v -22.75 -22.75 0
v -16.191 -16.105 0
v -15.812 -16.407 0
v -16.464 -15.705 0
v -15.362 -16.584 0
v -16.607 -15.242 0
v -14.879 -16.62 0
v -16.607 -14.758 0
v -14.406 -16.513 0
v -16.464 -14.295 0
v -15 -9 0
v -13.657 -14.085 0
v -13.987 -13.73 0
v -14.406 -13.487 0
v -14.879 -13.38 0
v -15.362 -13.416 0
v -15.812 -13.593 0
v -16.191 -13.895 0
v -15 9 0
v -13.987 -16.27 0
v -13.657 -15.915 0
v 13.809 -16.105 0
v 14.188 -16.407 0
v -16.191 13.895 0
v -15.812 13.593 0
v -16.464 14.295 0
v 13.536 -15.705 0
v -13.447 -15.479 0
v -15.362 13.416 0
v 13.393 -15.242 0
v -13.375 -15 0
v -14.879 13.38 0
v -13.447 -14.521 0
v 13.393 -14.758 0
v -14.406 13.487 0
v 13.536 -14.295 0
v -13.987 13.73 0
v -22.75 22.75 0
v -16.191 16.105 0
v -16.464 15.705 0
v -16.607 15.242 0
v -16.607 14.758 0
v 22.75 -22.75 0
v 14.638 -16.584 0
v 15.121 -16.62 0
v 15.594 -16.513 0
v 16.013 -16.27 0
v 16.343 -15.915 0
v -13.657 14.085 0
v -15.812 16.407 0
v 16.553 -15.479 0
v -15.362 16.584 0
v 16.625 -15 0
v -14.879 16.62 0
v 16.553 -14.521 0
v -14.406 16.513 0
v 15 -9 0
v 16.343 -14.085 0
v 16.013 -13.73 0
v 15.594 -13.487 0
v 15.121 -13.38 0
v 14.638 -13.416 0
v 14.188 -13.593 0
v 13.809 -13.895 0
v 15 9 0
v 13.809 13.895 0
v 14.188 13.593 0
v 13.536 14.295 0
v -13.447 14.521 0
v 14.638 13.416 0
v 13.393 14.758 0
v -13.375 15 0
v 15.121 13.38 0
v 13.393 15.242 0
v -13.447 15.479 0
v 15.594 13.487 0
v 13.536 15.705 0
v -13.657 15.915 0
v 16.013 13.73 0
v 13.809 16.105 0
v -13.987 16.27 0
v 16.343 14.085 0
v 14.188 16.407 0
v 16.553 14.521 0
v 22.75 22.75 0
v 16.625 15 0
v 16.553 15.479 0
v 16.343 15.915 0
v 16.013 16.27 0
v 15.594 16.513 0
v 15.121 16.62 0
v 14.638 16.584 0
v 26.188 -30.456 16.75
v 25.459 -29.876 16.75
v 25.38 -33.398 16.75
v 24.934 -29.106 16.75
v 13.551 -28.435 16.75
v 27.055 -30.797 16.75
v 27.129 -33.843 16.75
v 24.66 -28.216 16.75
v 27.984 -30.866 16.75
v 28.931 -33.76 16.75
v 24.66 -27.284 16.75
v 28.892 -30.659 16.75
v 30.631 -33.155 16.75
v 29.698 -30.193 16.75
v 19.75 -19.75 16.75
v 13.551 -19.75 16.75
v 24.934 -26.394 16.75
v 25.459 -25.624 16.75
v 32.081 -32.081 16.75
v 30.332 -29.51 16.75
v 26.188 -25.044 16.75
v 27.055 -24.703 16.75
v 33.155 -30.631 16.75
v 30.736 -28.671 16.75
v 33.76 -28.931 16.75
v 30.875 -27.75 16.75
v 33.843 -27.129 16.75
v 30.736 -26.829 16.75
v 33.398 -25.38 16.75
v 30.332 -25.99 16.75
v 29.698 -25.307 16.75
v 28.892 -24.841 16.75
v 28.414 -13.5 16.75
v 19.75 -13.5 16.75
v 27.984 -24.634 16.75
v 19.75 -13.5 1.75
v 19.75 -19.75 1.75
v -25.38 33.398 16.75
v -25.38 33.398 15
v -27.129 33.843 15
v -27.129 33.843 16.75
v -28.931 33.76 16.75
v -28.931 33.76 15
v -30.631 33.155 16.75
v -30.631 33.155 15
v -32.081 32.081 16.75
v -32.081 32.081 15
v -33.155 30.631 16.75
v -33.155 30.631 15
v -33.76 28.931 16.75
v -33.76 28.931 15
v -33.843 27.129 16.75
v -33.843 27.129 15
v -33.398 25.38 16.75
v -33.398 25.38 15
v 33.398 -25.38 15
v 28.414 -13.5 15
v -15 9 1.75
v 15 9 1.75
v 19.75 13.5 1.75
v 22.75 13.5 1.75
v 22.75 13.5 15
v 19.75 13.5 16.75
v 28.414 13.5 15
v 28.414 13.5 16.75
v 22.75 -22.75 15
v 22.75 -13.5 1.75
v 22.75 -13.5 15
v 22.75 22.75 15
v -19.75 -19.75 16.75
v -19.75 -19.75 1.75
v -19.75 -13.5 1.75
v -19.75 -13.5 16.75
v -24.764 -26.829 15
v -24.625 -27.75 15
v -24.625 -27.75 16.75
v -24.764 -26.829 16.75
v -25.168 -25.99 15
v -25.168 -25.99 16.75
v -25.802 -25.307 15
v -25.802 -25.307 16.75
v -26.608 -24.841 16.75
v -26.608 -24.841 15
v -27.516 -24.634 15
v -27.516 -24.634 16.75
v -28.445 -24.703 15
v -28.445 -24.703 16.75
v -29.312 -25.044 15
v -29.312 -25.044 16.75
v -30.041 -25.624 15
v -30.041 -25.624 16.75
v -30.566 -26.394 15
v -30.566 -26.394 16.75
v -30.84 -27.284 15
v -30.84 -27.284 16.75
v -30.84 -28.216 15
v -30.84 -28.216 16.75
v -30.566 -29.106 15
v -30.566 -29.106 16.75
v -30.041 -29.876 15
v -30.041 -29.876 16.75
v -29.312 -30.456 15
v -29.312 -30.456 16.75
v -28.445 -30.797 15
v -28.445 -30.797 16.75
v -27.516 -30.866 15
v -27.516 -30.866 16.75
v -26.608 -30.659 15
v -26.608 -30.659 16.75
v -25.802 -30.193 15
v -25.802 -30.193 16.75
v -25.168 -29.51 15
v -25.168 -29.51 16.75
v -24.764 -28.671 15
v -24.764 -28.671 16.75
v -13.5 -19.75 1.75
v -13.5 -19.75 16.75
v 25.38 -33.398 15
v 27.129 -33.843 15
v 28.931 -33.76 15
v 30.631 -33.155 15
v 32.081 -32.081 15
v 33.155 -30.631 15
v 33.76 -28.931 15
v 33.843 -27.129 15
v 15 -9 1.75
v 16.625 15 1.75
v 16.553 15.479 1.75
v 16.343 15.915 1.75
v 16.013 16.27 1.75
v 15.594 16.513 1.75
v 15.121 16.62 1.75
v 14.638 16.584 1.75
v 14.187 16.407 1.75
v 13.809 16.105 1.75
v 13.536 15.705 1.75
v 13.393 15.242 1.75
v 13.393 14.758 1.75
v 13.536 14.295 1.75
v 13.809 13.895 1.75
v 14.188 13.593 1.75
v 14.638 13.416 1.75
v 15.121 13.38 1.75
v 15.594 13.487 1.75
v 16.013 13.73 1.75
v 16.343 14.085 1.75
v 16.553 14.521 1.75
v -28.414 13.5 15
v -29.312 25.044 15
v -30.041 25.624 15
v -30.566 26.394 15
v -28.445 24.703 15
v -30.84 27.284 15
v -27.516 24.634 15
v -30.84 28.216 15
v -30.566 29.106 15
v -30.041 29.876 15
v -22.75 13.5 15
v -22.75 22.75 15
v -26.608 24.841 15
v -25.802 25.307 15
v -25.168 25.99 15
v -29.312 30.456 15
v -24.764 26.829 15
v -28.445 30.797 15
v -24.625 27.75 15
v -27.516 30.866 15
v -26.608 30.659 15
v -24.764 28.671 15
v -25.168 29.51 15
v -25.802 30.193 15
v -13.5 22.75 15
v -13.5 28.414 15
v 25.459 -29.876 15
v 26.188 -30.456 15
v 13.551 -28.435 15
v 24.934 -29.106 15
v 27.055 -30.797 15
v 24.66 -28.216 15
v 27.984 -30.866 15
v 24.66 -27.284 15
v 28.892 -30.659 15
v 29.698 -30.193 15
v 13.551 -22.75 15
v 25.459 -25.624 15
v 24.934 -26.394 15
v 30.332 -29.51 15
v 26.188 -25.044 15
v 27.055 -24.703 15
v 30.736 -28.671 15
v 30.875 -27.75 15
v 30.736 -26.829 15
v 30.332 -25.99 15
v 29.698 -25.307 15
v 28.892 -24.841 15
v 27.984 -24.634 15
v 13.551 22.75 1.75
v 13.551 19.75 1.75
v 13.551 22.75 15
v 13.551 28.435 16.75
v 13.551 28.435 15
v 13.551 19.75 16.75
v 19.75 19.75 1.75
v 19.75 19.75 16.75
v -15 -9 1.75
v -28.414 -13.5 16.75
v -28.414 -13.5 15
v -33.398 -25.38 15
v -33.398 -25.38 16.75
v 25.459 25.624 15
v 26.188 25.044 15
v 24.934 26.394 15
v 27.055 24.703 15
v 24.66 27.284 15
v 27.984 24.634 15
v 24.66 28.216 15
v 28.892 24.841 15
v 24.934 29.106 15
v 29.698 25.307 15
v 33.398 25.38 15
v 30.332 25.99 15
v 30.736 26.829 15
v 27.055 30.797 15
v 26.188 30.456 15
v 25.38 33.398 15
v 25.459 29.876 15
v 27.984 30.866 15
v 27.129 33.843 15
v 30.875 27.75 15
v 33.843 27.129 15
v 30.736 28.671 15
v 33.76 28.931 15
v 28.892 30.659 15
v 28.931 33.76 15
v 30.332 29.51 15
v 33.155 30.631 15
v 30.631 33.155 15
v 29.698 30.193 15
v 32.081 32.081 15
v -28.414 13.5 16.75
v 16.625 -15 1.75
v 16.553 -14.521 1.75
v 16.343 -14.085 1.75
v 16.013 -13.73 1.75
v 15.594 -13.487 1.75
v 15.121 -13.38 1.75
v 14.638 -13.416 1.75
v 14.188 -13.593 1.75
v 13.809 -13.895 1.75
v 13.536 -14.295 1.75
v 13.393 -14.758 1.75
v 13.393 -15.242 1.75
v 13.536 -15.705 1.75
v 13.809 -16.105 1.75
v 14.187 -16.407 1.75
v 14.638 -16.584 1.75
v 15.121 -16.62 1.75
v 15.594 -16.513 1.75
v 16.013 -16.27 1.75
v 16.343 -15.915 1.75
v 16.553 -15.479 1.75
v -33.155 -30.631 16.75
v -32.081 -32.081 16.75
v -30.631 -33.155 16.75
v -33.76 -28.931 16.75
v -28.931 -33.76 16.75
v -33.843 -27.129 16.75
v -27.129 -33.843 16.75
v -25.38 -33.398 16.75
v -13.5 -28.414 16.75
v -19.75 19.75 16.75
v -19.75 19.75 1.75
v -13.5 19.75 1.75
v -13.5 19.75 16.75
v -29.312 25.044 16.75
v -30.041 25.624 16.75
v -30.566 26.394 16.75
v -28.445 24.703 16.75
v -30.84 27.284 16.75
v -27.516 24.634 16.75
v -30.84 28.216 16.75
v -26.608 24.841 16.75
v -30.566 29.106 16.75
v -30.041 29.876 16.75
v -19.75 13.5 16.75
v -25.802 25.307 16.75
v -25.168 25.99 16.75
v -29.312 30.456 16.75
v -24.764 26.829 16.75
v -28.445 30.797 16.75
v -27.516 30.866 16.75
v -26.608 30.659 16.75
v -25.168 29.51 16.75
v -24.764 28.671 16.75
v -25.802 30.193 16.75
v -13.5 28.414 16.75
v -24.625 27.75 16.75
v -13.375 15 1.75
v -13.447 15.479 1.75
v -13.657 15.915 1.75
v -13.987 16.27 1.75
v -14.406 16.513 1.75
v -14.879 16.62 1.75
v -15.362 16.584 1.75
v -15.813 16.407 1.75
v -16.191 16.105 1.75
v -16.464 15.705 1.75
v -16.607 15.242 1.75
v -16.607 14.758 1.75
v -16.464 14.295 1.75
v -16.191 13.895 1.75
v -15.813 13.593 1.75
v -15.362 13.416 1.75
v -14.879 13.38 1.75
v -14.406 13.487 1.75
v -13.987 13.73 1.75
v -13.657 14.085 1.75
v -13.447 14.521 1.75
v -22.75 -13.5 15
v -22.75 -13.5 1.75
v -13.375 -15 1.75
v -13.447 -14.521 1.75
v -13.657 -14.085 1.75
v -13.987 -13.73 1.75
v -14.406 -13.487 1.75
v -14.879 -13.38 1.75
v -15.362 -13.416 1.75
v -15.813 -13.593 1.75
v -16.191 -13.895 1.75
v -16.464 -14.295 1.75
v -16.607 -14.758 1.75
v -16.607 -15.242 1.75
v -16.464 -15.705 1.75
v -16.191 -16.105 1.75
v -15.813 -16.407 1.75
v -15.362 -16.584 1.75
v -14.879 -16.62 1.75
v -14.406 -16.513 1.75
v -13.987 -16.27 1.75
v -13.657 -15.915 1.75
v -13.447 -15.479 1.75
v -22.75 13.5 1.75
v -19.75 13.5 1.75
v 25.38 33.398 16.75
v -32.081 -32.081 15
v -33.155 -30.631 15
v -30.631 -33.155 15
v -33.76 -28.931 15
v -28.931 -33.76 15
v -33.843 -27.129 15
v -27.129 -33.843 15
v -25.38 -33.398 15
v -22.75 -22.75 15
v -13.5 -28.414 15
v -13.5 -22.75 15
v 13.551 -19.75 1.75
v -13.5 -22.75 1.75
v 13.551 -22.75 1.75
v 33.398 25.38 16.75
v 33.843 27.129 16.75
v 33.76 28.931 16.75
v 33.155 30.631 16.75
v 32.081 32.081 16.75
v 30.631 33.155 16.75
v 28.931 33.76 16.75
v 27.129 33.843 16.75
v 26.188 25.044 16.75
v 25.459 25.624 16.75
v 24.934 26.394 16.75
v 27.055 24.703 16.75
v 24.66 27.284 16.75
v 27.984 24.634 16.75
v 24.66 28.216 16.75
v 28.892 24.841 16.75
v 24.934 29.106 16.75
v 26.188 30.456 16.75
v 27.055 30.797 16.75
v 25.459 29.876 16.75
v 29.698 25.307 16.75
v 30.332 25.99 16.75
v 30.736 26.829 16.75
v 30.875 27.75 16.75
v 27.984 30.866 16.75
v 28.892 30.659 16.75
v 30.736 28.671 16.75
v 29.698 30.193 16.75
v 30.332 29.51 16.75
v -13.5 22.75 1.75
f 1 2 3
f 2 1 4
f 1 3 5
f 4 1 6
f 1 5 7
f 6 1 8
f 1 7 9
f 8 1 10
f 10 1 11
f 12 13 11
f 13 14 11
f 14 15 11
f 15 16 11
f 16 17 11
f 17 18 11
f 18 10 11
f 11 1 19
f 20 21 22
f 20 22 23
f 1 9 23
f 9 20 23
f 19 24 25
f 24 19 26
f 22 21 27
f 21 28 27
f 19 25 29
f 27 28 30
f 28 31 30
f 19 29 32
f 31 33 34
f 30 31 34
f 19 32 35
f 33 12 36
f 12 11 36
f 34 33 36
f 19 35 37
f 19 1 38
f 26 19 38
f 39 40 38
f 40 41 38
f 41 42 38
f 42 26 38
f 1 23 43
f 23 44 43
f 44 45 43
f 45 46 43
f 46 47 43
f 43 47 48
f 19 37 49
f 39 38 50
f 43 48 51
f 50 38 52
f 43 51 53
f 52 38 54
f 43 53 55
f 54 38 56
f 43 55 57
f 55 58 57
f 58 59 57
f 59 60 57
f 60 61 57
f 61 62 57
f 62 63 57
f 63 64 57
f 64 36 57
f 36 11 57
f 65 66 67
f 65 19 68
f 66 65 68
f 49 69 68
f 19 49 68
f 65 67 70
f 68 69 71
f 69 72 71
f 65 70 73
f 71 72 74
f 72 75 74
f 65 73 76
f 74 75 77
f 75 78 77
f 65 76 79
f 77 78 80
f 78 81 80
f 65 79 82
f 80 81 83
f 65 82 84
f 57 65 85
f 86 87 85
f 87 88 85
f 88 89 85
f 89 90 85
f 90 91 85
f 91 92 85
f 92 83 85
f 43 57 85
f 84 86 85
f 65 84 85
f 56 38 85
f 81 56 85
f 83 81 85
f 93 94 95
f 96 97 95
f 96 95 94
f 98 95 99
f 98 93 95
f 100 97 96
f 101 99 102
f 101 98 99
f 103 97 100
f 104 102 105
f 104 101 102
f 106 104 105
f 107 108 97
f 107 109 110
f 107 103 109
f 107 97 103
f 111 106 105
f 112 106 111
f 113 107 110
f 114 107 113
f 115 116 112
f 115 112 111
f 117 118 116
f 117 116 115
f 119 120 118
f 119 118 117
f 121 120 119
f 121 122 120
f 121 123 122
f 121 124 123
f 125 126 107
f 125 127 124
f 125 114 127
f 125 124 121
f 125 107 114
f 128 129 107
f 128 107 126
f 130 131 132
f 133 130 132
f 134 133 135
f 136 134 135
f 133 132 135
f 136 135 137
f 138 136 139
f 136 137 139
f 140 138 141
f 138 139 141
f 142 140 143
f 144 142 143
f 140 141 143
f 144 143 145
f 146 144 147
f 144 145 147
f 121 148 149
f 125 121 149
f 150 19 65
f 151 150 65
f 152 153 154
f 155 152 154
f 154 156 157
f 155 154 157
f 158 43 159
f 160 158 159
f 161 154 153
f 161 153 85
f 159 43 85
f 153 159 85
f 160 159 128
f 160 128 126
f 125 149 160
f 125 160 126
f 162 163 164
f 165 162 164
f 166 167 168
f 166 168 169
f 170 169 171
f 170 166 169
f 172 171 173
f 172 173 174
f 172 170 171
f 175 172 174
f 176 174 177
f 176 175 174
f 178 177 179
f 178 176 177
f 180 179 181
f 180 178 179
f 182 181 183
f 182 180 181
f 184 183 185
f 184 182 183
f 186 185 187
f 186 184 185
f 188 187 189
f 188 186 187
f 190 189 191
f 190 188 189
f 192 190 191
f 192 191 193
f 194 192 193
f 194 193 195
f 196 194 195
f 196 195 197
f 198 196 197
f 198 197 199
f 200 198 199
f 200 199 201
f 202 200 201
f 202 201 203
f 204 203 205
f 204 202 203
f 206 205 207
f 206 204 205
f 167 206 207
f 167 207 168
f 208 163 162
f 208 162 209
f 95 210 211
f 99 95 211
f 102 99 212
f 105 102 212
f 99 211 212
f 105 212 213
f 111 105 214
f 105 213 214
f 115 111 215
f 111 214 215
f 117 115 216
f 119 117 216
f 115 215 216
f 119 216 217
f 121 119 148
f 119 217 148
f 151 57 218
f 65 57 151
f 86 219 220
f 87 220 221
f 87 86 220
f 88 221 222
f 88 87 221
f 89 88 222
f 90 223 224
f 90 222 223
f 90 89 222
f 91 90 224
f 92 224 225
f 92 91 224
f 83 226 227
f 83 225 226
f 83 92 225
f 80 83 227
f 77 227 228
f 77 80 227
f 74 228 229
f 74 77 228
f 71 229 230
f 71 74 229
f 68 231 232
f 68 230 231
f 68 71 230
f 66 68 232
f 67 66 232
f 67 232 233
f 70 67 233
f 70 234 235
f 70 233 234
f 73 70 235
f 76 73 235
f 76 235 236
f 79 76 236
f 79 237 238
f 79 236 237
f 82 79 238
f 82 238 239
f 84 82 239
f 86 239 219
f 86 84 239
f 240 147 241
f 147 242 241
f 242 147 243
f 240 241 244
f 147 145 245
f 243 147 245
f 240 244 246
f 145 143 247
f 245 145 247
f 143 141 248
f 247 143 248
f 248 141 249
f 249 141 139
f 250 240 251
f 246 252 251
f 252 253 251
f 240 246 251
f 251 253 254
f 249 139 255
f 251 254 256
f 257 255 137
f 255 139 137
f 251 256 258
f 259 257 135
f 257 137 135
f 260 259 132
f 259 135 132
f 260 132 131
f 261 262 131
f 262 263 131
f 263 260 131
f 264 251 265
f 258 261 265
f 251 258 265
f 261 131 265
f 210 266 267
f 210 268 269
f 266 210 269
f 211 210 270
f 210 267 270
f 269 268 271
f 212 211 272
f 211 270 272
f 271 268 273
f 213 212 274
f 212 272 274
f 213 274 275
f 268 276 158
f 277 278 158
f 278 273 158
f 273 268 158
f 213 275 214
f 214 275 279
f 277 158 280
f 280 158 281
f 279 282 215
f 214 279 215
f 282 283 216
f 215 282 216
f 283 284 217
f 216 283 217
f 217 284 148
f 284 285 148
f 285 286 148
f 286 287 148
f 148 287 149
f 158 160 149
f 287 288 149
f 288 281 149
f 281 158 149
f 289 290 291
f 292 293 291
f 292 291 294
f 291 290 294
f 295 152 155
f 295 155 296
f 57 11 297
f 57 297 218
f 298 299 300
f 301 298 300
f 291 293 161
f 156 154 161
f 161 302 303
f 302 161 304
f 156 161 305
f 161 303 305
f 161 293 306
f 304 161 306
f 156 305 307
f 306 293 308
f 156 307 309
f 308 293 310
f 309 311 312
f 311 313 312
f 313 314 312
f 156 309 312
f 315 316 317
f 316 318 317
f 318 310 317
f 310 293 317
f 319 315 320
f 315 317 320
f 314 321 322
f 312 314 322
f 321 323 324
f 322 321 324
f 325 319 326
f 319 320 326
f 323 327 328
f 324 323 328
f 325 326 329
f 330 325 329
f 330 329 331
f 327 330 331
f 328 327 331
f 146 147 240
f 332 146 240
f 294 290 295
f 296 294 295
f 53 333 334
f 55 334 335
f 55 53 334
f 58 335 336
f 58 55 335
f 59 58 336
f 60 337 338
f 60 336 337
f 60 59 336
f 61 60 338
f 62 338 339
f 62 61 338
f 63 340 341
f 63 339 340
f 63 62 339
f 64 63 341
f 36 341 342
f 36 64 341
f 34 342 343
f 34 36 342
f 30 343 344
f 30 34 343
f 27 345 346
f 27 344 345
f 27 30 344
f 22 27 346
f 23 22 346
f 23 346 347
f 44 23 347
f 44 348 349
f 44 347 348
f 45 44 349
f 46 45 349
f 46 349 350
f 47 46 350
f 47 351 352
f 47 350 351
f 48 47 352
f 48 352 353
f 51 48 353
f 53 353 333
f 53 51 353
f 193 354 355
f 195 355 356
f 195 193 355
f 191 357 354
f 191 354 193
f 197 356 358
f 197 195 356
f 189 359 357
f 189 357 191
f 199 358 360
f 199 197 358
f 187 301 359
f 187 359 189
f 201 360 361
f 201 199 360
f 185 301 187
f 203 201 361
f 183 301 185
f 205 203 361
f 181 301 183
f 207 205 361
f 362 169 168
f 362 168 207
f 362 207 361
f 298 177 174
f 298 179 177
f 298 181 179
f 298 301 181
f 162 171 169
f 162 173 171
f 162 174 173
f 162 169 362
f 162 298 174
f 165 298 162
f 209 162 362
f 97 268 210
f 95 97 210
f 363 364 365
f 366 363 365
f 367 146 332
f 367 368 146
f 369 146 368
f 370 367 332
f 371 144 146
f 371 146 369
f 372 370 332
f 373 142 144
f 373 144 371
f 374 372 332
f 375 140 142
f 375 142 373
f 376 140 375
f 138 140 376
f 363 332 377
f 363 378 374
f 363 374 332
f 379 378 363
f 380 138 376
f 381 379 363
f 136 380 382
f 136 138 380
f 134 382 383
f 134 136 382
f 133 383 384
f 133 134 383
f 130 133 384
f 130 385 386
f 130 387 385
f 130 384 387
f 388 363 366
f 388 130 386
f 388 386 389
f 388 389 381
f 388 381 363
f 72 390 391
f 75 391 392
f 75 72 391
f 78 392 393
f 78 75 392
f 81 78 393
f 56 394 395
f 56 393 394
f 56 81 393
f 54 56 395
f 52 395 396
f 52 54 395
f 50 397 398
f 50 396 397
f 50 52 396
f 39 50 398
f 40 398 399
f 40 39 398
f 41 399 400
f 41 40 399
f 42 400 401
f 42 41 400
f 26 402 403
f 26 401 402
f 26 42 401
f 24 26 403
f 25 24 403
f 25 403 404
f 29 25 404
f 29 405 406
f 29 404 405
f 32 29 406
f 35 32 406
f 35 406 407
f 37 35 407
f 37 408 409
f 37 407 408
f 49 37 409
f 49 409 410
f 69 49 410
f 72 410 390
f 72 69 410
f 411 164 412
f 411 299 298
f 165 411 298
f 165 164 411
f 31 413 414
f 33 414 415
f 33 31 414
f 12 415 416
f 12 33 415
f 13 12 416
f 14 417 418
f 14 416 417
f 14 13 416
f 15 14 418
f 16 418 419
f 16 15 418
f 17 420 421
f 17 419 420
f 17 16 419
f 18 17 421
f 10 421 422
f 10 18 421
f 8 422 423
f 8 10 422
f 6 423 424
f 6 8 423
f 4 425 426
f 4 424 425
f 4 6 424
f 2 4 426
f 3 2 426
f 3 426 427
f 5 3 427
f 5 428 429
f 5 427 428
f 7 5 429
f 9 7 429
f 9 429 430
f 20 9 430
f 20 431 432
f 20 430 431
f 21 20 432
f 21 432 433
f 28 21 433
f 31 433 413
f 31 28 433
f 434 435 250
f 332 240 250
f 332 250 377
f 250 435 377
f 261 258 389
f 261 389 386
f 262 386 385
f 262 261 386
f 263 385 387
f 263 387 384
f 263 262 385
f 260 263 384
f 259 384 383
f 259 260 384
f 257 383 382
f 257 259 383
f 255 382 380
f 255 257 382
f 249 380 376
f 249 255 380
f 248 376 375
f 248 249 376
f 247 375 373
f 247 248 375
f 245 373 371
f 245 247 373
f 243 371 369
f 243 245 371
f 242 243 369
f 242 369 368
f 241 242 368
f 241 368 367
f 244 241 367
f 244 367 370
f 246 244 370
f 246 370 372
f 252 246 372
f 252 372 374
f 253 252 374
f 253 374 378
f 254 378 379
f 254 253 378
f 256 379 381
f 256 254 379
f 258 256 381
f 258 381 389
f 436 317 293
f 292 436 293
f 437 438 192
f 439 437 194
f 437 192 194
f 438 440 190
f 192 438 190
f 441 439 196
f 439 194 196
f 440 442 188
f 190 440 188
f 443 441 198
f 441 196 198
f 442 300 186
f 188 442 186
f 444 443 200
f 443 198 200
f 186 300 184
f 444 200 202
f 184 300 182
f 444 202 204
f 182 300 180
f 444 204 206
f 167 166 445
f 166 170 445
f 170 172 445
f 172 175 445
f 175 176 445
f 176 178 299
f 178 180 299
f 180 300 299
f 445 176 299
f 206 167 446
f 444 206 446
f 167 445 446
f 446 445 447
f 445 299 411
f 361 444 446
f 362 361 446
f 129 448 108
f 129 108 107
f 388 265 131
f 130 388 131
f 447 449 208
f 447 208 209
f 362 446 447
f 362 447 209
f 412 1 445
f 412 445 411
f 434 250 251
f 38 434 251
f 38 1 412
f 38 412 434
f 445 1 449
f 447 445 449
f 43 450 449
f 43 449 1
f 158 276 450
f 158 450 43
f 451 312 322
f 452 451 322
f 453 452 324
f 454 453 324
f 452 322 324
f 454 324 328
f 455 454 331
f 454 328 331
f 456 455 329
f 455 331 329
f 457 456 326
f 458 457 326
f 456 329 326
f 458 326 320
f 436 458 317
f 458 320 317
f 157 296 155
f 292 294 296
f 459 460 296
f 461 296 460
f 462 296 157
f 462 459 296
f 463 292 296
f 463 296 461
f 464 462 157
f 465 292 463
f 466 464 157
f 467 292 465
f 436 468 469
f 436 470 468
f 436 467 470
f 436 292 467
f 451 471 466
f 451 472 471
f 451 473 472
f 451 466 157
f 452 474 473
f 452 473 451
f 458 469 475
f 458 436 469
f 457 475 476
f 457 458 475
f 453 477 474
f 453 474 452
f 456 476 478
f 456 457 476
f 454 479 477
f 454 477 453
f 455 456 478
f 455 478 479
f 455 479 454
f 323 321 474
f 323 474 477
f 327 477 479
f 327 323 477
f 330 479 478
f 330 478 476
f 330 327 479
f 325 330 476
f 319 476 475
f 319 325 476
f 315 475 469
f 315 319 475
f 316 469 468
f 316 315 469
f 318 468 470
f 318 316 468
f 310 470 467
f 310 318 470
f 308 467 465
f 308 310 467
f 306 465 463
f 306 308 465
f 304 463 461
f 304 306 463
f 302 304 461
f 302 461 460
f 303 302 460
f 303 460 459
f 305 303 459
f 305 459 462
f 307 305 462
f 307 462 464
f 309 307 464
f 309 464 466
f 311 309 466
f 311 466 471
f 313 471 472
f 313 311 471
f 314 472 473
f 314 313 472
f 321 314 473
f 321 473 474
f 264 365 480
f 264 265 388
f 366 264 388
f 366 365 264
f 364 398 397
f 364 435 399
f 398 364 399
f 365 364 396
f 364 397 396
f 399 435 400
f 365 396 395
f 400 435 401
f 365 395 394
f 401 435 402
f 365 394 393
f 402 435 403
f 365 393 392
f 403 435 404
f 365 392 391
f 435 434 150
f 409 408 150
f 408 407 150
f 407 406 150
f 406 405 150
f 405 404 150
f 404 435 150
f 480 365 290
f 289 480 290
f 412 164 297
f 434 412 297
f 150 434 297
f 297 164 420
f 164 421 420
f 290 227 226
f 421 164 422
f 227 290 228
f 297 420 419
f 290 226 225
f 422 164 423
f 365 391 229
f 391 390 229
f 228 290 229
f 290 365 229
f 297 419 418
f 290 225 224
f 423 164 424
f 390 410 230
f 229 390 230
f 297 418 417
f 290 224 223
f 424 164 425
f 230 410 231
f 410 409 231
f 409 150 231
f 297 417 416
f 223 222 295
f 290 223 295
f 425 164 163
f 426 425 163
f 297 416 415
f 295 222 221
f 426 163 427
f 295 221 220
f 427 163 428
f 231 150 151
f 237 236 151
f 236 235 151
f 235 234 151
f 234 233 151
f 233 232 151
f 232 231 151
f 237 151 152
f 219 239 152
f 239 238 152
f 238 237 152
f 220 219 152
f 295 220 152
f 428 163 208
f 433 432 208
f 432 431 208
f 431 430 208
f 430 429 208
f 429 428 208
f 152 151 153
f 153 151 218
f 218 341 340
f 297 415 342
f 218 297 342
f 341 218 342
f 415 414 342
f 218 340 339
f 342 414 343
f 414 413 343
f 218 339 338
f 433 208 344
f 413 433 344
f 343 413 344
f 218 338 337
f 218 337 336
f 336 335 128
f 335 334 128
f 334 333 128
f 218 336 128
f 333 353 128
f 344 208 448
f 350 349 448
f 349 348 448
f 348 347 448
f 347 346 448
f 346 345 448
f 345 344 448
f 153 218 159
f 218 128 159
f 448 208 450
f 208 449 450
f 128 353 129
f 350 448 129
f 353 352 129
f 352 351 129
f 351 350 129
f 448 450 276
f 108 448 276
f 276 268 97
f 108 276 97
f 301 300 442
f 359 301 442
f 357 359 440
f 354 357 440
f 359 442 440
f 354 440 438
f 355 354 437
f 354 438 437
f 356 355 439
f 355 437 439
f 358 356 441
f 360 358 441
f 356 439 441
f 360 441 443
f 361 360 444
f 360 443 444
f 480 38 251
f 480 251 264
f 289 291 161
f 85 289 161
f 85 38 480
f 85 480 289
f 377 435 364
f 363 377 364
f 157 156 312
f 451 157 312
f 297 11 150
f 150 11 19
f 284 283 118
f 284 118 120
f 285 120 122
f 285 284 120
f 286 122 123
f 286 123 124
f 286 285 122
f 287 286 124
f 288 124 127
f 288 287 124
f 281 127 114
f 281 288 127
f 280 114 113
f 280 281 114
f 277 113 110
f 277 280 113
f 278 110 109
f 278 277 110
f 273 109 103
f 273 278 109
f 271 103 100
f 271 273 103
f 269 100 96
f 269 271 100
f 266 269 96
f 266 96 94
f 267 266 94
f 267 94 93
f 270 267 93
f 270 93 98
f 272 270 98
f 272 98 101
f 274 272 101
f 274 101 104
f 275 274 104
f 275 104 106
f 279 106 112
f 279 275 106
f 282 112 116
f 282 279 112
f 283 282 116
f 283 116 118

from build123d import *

# Parameters (mm, degrees)
F0_W      = 39.5
F0_H      = 39.5
F0_R      = 1.625
F0_W_2    = 30
F0_H_2    = 18
F1_DEPTH  = 1.75
F2_W      = 45.5
F2_H      = 45.5
F2_W_2    = 39.5
F2_H_2    = 39.5
F3_DEPTH  = 15
F4_R      = 3.125
F4_W      = 39.5
F4_H      = 39.5
F5_DEPTH  = 1.75
F6_W      = 27.05052
F6_H      = 15
F7_DEPTH  = 25
F8_DEPTH  = 56.626
F9_W      = 27
F9_H      = 15
F10_DEPTH = 11.126
F11_DEPTH = 56.626


with BuildPart() as f1:
    # F0 (on Top) → F1 (new body)
    with BuildSketch(Plane.XY):
        Rectangle(F0_W, F0_H)
        with Locations((-15, -15)):
            Circle(F0_R, mode=Mode.SUBTRACT)
        with Locations((15, -15)):
            Circle(F0_R, mode=Mode.SUBTRACT)
        with Locations((-15, 15)):
            Circle(F0_R, mode=Mode.SUBTRACT)
        Rectangle(F0_W_2, F0_H_2, mode=Mode.SUBTRACT)
        with Locations((15, 15)):
            Circle(F0_R, mode=Mode.SUBTRACT)
    extrude(amount=F1_DEPTH)

    # F2 (on Top) → F3 (join)
    with BuildSketch(Plane.XY):
        Rectangle(F2_W, F2_H)
        Rectangle(F2_W_2, F2_H_2, mode=Mode.SUBTRACT)
    extrude(amount=F3_DEPTH)

    # F4 (on face) → F5 (join)
    with BuildSketch(Plane.XY.offset(15)):
        with BuildLine():
            Line((0, 22.75), (-25.380415, 33.39807))
            ThreePointArc((-25.380415, 33.39807), (-32.081029, 32.081029), (-33.39807, 25.380415))
            Line((-33.39807, 25.380415), (-22.75, 0))
            Line((-22.75, 0), (-33.39807, -25.380415))
            ThreePointArc((-33.39807, -25.380415), (-32.081029, -32.081029), (-25.380415, -33.39807))
            Line((-25.380415, -33.39807), (0, -22.75))
            Line((0, -22.75), (25.380415, -33.39807))
            ThreePointArc((25.380415, -33.39807), (32.081029, -32.081029), (33.39807, -25.380415))
            Line((33.39807, -25.380415), (22.75, 0))
            Line((22.75, 0), (33.39807, 25.380415))
            ThreePointArc((33.39807, 25.380415), (32.081029, 32.081029), (25.380415, 33.39807))
            Line((25.380415, 33.39807), (0, 22.75))
        make_face()
        with Locations((-27.75, -27.75)):
            Circle(F4_R, mode=Mode.SUBTRACT)
        with Locations((27.75, -27.75)):
            Circle(F4_R, mode=Mode.SUBTRACT)
        Rectangle(F4_W, F4_H, mode=Mode.SUBTRACT)
        with Locations((-27.75, 27.75)):
            Circle(F4_R, mode=Mode.SUBTRACT)
        with Locations((27.75, 27.75)):
            Circle(F4_R, mode=Mode.SUBTRACT)
    extrude(amount=F5_DEPTH)

    # F6 (on face) → F7 (cut)
    with BuildSketch(Plane.XZ.offset(22.75)):
        with Locations((0.02526, 9.25)):
            Rectangle(F6_W, F6_H)
    extrude(amount=F7_DEPTH, mode=Mode.SUBTRACT)

    # F6 (on face) → F8 (cut, through all)
    with BuildSketch(Plane.XZ.offset(22.75)):
        with Locations((0.02526, 9.25)):
            Rectangle(F6_W, F6_H)
    extrude(amount=-F8_DEPTH, mode=Mode.SUBTRACT)

    # F9 (on face) → F10 (cut, through all)
    with BuildSketch(Plane.YZ.offset(22.75)):
        with Locations((0, 9.25)):
            Rectangle(F9_W, F9_H)
    extrude(amount=F10_DEPTH, mode=Mode.SUBTRACT)

    # F9 (on face) → F11 (cut, through all)
    with BuildSketch(Plane.YZ.offset(22.75)):
        with Locations((0, 9.25)):
            Rectangle(F9_W, F9_H)
    extrude(amount=-F11_DEPTH, mode=Mode.SUBTRACT)


solid = f1.part
